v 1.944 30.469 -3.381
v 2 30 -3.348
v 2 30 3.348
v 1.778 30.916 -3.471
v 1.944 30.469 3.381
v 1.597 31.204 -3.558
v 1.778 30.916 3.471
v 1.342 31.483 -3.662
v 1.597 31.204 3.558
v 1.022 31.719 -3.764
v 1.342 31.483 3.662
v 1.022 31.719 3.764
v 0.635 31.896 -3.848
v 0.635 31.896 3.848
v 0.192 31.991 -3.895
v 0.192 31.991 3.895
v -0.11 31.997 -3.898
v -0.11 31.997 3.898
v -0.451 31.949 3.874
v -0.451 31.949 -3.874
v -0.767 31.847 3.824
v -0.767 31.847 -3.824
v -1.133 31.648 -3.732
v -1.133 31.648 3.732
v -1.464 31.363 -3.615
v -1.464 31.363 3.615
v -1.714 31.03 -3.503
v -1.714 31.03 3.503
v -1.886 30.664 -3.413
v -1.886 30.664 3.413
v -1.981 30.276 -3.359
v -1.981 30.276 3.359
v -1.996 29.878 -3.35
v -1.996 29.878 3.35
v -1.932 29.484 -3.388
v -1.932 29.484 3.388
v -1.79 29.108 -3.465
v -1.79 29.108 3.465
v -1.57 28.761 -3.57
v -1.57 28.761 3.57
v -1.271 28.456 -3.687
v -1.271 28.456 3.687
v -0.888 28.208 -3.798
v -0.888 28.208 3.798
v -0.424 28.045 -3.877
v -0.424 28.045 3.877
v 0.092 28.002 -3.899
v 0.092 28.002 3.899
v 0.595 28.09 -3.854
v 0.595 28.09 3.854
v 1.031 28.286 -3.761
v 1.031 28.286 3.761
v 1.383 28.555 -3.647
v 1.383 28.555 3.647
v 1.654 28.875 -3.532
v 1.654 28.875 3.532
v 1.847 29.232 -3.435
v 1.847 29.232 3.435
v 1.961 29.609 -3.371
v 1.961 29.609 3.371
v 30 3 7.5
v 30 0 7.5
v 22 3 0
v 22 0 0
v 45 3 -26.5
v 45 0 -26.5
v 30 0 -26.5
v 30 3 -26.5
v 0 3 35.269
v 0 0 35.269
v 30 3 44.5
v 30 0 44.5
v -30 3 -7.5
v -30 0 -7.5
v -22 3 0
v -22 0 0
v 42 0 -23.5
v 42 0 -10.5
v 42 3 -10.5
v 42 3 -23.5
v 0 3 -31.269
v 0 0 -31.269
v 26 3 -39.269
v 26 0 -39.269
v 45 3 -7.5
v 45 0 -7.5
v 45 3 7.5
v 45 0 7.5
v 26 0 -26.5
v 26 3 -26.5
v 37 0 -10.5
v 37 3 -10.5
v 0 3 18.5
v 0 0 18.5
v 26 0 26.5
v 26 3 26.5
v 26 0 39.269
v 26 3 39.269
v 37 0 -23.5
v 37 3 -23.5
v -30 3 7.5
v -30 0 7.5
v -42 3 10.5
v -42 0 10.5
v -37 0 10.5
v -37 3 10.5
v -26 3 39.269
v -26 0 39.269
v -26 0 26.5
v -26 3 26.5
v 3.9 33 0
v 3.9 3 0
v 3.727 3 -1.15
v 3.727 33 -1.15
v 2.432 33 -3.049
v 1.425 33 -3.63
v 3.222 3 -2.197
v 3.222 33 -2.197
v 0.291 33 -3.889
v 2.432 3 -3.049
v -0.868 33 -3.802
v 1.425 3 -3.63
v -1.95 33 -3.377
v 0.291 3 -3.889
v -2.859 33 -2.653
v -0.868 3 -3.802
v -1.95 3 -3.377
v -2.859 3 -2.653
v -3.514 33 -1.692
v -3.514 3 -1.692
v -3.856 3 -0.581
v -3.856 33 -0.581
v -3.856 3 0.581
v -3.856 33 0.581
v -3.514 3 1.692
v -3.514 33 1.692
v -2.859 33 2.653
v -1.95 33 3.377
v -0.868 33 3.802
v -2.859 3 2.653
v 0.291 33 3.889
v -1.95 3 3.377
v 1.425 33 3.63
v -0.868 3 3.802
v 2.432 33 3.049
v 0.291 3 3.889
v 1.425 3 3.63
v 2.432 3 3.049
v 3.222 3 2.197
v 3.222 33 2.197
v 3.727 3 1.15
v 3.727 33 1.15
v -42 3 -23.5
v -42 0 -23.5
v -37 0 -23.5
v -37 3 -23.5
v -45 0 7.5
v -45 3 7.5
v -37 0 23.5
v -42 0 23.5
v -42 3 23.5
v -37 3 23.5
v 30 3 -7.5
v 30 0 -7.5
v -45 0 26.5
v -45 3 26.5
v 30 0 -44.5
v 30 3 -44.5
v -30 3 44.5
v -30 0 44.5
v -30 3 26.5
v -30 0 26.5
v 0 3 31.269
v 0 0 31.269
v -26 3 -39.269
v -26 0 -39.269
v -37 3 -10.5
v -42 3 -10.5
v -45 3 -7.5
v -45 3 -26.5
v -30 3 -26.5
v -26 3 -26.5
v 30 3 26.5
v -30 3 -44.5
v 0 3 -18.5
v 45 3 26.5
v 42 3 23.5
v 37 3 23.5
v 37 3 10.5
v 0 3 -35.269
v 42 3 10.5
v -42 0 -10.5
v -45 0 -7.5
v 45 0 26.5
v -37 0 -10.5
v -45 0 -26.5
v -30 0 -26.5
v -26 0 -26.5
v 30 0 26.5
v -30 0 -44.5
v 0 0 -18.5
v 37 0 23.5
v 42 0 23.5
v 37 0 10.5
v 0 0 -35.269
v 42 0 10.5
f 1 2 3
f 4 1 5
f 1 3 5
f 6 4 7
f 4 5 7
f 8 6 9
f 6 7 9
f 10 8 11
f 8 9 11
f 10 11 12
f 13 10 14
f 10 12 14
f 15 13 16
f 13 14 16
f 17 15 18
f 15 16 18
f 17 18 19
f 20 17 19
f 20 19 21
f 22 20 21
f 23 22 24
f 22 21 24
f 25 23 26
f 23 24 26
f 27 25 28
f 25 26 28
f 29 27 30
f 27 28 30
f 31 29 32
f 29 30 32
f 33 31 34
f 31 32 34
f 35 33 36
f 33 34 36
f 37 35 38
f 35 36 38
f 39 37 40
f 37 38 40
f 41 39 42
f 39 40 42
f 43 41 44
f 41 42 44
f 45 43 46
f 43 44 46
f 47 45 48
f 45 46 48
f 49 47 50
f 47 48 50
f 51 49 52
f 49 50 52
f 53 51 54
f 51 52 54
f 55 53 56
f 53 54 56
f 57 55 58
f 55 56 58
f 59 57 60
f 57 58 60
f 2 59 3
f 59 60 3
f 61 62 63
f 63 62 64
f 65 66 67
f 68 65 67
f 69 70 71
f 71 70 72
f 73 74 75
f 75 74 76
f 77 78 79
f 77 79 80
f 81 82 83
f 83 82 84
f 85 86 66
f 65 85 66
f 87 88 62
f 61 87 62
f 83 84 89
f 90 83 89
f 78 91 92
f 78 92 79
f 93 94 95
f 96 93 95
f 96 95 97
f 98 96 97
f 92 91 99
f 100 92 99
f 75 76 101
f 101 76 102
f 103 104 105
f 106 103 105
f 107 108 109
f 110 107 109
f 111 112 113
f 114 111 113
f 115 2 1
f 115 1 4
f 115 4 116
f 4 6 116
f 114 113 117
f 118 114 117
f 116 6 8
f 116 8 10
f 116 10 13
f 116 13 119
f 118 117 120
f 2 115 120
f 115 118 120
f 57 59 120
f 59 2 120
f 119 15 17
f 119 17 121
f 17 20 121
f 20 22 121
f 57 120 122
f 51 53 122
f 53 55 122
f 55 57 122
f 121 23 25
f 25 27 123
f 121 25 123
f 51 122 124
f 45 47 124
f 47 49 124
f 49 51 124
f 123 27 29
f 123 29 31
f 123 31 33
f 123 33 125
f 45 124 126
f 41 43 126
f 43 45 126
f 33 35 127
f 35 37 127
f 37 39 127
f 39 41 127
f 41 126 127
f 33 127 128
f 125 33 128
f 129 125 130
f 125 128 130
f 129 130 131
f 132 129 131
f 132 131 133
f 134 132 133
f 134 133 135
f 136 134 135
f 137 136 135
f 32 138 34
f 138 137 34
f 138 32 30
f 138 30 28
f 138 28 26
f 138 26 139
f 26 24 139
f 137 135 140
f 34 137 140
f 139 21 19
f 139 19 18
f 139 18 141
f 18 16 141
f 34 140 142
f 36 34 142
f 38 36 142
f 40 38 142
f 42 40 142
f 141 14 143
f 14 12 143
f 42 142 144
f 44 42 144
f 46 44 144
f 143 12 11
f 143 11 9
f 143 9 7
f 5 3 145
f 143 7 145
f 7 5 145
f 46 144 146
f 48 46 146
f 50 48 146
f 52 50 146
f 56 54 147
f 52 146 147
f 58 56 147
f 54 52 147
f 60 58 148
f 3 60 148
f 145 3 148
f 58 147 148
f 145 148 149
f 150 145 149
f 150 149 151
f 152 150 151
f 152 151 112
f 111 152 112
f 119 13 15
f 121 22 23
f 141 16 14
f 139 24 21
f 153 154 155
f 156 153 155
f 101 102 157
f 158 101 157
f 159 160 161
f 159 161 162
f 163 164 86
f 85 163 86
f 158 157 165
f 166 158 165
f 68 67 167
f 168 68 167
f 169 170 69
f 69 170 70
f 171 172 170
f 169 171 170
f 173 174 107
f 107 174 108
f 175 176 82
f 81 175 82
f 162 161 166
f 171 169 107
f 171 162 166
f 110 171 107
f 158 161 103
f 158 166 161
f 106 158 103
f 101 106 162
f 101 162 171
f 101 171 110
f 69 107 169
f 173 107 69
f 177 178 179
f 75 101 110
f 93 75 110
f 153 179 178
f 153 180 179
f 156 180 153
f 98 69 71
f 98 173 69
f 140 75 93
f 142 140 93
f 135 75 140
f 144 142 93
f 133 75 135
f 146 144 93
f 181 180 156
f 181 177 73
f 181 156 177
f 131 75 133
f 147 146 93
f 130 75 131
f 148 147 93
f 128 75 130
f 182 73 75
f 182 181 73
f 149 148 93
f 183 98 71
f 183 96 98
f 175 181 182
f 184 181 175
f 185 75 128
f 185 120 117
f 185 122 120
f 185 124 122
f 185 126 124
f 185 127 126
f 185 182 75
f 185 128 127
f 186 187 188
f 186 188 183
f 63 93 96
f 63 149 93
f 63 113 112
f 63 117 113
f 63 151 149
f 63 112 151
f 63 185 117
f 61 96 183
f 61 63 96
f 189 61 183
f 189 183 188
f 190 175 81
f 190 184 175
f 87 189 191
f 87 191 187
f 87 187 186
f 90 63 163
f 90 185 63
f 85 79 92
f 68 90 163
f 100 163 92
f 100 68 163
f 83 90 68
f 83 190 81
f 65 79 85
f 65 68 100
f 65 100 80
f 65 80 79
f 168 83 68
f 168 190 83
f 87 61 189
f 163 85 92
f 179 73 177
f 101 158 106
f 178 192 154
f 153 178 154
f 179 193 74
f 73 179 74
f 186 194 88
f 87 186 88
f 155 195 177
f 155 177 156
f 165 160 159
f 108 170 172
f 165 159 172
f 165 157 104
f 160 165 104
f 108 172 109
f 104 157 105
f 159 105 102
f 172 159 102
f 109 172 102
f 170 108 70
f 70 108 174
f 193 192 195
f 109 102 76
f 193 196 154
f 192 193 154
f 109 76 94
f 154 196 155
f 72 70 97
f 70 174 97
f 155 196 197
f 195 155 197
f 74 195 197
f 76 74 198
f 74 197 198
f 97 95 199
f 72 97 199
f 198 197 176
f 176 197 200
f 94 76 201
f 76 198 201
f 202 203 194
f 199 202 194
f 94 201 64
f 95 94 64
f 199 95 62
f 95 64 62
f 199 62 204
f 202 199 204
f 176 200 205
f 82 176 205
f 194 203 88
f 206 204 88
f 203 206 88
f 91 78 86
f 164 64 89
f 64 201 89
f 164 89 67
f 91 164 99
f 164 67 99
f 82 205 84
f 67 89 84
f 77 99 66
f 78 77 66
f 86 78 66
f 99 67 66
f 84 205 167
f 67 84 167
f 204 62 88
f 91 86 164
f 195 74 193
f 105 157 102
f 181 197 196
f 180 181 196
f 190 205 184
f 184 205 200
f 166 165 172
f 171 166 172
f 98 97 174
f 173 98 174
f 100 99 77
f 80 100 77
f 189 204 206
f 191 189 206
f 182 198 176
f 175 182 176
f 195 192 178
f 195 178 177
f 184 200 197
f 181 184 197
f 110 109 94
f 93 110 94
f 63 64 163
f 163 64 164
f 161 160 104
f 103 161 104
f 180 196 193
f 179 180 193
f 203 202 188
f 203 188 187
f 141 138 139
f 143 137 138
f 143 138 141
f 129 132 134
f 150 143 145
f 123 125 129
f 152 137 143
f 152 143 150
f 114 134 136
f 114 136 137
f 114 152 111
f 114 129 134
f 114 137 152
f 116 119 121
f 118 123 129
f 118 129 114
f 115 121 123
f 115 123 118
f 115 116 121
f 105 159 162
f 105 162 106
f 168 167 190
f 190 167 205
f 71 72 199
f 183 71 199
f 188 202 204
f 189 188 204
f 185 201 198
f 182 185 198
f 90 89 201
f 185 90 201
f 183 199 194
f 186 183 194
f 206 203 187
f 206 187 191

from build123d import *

# Parameters (mm, degrees)
CROQUIS1_W                 = 5
CROQUIS1_H                 = 13
SALIENTE_EXTRUIR1_DEPTH    = 3
CROQUIS9_R                 = 3.9
SALIENTE_EXTRUIR2_DEPTH    = 30
CROQUIS10_R                = 2
CORTAR_EXTRUIR7_DEPTH      = 45.5
CORTAR_EXTRUIR7_DEPTH_BACK = 45.5


with BuildPart() as part:
    # Croquis1 → Saliente-Extruir1 (new body)
    with BuildSketch(Plane(origin=(0, 0, 0), x_dir=(1, 0, 0), z_dir=(0, 1, 0))):
        Polygon((-45, -26.5), (-30, -26.5), (-30, -44.5), (0, -35.269230769), (30, -44.5), (30, -26.5), (45, -26.5), (45, -7.5), (30, -7.5), (22, 0), (30, 7.5), (45, 7.5), (45, 26.5), (30, 26.5), (30, 44.5), (0, 35.269230769), (-30, 44.5), (-30, 26.5), (-45, 26.5), (-45, 7.5), (-30, 7.5), (-22, 0), (-30, -7.5), (-45, -7.5), align=None)
        Polygon((0, -18.5), (26, -26.5), (26, -39.269230769), (0, -31.269230769), (-26, -39.269230769), (-26, -26.5), align=None, mode=Mode.SUBTRACT)
        Polygon((26, 26.5), (0, 18.5), (-26, 26.5), (-26, 39.269230769), (0, 31.269230769), (26, 39.269230769), align=None, mode=Mode.SUBTRACT)
        with Locations((39.5, -17)):
            Rectangle(CROQUIS1_W, CROQUIS1_H, mode=Mode.SUBTRACT)
        with Locations((39.5, 17)):
            Rectangle(CROQUIS1_W, CROQUIS1_H, mode=Mode.SUBTRACT)
        with Locations((-39.5, 17)):
            Rectangle(CROQUIS1_W, CROQUIS1_H, mode=Mode.SUBTRACT)
        with Locations((-39.5, -17)):
            Rectangle(CROQUIS1_W, CROQUIS1_H, mode=Mode.SUBTRACT)
    extrude(amount=SALIENTE_EXTRUIR1_DEPTH)

    # Croquis9 → Saliente-Extruir2 (add)
    with BuildSketch(Plane(origin=(0, 3, 0), x_dir=(1, 0, 0), z_dir=(0, 1, 0))):
        Circle(CROQUIS9_R)
    extrude(amount=SALIENTE_EXTRUIR2_DEPTH)

    # Croquis10 → Cortar-Extruir7 (cut, two sides)
    with BuildSketch(Plane.XY) as cortar_extruir7_sk:
        with Locations((0, 30)):
            Circle(CROQUIS10_R)
    extrude(amount=CORTAR_EXTRUIR7_DEPTH, mode=Mode.SUBTRACT)
    extrude(cortar_extruir7_sk.sketch, amount=-CORTAR_EXTRUIR7_DEPTH_BACK, mode=Mode.SUBTRACT)


solid = part.part
